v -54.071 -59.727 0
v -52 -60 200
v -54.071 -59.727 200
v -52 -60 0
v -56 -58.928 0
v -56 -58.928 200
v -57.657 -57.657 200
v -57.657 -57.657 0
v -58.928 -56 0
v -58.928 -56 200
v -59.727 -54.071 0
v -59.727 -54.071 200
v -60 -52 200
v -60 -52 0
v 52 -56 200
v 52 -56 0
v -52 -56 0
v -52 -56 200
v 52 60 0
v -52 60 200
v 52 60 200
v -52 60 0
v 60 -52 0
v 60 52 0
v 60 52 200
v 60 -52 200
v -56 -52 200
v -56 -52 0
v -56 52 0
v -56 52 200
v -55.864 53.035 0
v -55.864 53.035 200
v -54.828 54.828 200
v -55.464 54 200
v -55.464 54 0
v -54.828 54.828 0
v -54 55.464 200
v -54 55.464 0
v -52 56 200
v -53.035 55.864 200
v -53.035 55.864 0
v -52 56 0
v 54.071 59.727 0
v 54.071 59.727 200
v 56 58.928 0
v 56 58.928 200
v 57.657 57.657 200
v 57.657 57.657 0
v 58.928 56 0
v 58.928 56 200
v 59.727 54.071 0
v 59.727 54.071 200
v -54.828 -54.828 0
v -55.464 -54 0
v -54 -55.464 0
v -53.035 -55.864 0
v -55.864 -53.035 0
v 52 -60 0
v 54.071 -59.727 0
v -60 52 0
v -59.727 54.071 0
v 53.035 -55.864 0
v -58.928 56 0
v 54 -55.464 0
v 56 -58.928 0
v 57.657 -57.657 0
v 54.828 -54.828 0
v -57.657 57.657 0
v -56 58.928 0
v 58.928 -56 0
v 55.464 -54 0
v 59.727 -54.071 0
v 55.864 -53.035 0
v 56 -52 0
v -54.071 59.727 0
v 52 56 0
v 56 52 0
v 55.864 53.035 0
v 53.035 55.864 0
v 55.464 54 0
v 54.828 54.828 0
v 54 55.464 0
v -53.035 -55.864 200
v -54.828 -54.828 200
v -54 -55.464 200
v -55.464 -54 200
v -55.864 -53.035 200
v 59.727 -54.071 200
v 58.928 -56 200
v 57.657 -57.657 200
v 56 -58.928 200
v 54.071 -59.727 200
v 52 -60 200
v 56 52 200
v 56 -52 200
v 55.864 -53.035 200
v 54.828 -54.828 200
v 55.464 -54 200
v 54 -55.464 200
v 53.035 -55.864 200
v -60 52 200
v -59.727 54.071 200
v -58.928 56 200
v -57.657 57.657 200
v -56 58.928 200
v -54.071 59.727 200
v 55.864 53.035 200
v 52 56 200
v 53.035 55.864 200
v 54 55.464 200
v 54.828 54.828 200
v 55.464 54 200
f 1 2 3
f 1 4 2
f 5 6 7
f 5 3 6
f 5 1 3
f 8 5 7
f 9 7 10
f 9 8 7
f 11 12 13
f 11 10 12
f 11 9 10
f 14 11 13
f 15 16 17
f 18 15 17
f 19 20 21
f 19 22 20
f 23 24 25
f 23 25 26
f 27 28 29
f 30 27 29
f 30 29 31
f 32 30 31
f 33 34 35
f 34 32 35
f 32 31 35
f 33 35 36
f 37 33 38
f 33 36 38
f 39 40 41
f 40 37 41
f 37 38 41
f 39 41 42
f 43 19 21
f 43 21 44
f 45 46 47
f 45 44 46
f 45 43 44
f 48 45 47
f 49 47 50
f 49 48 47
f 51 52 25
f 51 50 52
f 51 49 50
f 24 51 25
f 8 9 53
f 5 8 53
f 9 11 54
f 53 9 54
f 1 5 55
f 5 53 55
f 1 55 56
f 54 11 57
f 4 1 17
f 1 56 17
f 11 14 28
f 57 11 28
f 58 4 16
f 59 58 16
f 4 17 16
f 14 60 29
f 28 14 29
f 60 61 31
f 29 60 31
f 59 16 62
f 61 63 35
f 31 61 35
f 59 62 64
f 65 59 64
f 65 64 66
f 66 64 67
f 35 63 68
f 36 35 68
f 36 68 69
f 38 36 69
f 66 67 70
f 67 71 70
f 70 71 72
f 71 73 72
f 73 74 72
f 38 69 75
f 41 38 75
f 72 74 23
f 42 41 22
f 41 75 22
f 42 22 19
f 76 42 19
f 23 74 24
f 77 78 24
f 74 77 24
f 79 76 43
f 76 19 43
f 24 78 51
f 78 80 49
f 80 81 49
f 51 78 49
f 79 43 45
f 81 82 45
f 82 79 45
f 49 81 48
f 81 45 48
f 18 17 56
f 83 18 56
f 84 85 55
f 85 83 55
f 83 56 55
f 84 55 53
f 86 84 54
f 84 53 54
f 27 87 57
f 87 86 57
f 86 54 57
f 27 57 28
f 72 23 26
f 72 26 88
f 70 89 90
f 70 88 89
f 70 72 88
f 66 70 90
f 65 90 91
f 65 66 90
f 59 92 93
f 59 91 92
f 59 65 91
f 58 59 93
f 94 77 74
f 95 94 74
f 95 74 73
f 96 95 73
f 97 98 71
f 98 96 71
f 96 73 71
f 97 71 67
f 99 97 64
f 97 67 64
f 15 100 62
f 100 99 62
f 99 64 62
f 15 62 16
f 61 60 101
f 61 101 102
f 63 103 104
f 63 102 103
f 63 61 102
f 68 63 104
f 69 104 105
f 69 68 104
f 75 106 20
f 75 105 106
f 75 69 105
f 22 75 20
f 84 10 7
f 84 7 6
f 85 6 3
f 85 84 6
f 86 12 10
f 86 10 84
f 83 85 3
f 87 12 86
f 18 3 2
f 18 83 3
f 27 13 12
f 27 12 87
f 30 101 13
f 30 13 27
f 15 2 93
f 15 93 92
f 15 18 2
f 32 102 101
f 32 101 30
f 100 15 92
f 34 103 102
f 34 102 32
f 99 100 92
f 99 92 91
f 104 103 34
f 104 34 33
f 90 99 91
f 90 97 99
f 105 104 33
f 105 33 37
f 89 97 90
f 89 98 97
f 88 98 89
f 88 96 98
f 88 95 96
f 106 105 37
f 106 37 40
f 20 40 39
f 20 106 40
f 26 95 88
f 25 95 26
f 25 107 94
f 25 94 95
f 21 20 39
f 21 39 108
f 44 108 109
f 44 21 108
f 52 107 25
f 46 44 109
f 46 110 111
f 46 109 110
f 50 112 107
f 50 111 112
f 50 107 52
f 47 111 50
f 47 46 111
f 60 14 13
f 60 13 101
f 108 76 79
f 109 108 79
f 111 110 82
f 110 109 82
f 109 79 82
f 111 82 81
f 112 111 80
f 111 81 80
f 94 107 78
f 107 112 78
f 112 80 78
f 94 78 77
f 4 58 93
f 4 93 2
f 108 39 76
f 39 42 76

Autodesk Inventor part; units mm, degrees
ref_plane "YZ Plane" through (0, 0, 0) normal (1, 0, 0) x (0, 1, 0)
ref_plane "Start plane" through (0, 0, 0) normal (0, 0, 1) x (1, 0, 0)
ref_plane "End plane" through (0, 0, 100) normal (0, 0, 1) x (1, 0, 0)
sketch "Sketch" plane through (0, 0, 0) normal (0, 0, 1) x (1, 0, 0)
  line L0 (-60, -52) -> (-60, 52)
  line L1 (-52, 60) -> (52, 60)
  line L2 (60, 52) -> (60, -52)
  line L3 (52, -60) -> (-52, -60)
  arc A0 (-60, -52) -> (-52, -60) centre (-52, -52) ccw
  arc A1 (-52, 60) -> (-60, 52) centre (-52, 52) ccw
  arc A2 (60, 52) -> (52, 60) centre (52, 52) ccw
  arc A3 (52, -60) -> (60, -52) centre (52, -52) ccw
  arc A4 (-52, 56) -> (-56, 52) centre (-52, 52) ccw
  line L4 (-52, 56) -> (52, 56)
  arc A5 (56, 52) -> (52, 56) centre (52, 52) ccw
  line L5 (56, 52) -> (56, -52)
  arc A6 (52, -56) -> (56, -52) centre (52, -52) ccw
  line L6 (52, -56) -> (-52, -56)
  arc A7 (-56, -52) -> (-52, -56) centre (-52, -52) ccw
  line L7 (-56, -52) -> (-56, 52)
  line L8 (0, 86.3196) -> (0, -86.3196) construction
  line L9 (-86.3196, 0) -> (86.3196, 0) construction
  circle A8 centre (0, 0) radius 4.9156 construction
  dimension "d7" = 8
  dimension "d10" = 120
  dimension "d11" = 120
  dimension "d12" = 4
  dimension "d15" = 60
  dimension "d16" = 60
extrude "Body" add sketch "Sketch" along normal blind 200
sketch "Sketch3" plane through (0, 0, 0) normal (0, 0, 1) x (1, 0, 0)
  line L0 (0, 0) -> (10, 0)
ref_plane "Work Plane3" through (0, 0, 0) normal (0, -1, 0) x (1, 0, 0)
sketch "Sketch4" plane through (0, 0, 0) normal (0, -1, 0) x (1, 0, 0)
  line L0 (-12.3242, 0) -> (13.7207, 0)
  line L1 (-12.3242, 100) -> (13.7207, 100)
  dimension "d18" = 100
sketch "Sketch5" plane through (0, 0, 0) normal (0, 0, 1) x (1, 0, 0)
  circle A0 centre (0, 0) radius 8.6035 construction
equation "\"d7\" = G_IR"
equation "\"d10\" = G_H"
equation "\"d11\" = G_W"
equation "\"d12\" = G_T"
equation "\"d15\" = 0.5 * d10"
equation "\"d16\" = 0.5 * d11"
equation "\"G_W\" = 120"
equation "\"G_H\" = 120"
equation "\"G_T\" = 4"
equation "\"G_IR\" = 8"
equation "\"G_L\" = d18"
equation "\"G_OFFSET_START\" = 0"
equation "\"G_OFFSET_END\" = 0"
properties part number "DIN EN 10219-2 - 120 x 120 x 4  - 100" material "Steel, Mild"
